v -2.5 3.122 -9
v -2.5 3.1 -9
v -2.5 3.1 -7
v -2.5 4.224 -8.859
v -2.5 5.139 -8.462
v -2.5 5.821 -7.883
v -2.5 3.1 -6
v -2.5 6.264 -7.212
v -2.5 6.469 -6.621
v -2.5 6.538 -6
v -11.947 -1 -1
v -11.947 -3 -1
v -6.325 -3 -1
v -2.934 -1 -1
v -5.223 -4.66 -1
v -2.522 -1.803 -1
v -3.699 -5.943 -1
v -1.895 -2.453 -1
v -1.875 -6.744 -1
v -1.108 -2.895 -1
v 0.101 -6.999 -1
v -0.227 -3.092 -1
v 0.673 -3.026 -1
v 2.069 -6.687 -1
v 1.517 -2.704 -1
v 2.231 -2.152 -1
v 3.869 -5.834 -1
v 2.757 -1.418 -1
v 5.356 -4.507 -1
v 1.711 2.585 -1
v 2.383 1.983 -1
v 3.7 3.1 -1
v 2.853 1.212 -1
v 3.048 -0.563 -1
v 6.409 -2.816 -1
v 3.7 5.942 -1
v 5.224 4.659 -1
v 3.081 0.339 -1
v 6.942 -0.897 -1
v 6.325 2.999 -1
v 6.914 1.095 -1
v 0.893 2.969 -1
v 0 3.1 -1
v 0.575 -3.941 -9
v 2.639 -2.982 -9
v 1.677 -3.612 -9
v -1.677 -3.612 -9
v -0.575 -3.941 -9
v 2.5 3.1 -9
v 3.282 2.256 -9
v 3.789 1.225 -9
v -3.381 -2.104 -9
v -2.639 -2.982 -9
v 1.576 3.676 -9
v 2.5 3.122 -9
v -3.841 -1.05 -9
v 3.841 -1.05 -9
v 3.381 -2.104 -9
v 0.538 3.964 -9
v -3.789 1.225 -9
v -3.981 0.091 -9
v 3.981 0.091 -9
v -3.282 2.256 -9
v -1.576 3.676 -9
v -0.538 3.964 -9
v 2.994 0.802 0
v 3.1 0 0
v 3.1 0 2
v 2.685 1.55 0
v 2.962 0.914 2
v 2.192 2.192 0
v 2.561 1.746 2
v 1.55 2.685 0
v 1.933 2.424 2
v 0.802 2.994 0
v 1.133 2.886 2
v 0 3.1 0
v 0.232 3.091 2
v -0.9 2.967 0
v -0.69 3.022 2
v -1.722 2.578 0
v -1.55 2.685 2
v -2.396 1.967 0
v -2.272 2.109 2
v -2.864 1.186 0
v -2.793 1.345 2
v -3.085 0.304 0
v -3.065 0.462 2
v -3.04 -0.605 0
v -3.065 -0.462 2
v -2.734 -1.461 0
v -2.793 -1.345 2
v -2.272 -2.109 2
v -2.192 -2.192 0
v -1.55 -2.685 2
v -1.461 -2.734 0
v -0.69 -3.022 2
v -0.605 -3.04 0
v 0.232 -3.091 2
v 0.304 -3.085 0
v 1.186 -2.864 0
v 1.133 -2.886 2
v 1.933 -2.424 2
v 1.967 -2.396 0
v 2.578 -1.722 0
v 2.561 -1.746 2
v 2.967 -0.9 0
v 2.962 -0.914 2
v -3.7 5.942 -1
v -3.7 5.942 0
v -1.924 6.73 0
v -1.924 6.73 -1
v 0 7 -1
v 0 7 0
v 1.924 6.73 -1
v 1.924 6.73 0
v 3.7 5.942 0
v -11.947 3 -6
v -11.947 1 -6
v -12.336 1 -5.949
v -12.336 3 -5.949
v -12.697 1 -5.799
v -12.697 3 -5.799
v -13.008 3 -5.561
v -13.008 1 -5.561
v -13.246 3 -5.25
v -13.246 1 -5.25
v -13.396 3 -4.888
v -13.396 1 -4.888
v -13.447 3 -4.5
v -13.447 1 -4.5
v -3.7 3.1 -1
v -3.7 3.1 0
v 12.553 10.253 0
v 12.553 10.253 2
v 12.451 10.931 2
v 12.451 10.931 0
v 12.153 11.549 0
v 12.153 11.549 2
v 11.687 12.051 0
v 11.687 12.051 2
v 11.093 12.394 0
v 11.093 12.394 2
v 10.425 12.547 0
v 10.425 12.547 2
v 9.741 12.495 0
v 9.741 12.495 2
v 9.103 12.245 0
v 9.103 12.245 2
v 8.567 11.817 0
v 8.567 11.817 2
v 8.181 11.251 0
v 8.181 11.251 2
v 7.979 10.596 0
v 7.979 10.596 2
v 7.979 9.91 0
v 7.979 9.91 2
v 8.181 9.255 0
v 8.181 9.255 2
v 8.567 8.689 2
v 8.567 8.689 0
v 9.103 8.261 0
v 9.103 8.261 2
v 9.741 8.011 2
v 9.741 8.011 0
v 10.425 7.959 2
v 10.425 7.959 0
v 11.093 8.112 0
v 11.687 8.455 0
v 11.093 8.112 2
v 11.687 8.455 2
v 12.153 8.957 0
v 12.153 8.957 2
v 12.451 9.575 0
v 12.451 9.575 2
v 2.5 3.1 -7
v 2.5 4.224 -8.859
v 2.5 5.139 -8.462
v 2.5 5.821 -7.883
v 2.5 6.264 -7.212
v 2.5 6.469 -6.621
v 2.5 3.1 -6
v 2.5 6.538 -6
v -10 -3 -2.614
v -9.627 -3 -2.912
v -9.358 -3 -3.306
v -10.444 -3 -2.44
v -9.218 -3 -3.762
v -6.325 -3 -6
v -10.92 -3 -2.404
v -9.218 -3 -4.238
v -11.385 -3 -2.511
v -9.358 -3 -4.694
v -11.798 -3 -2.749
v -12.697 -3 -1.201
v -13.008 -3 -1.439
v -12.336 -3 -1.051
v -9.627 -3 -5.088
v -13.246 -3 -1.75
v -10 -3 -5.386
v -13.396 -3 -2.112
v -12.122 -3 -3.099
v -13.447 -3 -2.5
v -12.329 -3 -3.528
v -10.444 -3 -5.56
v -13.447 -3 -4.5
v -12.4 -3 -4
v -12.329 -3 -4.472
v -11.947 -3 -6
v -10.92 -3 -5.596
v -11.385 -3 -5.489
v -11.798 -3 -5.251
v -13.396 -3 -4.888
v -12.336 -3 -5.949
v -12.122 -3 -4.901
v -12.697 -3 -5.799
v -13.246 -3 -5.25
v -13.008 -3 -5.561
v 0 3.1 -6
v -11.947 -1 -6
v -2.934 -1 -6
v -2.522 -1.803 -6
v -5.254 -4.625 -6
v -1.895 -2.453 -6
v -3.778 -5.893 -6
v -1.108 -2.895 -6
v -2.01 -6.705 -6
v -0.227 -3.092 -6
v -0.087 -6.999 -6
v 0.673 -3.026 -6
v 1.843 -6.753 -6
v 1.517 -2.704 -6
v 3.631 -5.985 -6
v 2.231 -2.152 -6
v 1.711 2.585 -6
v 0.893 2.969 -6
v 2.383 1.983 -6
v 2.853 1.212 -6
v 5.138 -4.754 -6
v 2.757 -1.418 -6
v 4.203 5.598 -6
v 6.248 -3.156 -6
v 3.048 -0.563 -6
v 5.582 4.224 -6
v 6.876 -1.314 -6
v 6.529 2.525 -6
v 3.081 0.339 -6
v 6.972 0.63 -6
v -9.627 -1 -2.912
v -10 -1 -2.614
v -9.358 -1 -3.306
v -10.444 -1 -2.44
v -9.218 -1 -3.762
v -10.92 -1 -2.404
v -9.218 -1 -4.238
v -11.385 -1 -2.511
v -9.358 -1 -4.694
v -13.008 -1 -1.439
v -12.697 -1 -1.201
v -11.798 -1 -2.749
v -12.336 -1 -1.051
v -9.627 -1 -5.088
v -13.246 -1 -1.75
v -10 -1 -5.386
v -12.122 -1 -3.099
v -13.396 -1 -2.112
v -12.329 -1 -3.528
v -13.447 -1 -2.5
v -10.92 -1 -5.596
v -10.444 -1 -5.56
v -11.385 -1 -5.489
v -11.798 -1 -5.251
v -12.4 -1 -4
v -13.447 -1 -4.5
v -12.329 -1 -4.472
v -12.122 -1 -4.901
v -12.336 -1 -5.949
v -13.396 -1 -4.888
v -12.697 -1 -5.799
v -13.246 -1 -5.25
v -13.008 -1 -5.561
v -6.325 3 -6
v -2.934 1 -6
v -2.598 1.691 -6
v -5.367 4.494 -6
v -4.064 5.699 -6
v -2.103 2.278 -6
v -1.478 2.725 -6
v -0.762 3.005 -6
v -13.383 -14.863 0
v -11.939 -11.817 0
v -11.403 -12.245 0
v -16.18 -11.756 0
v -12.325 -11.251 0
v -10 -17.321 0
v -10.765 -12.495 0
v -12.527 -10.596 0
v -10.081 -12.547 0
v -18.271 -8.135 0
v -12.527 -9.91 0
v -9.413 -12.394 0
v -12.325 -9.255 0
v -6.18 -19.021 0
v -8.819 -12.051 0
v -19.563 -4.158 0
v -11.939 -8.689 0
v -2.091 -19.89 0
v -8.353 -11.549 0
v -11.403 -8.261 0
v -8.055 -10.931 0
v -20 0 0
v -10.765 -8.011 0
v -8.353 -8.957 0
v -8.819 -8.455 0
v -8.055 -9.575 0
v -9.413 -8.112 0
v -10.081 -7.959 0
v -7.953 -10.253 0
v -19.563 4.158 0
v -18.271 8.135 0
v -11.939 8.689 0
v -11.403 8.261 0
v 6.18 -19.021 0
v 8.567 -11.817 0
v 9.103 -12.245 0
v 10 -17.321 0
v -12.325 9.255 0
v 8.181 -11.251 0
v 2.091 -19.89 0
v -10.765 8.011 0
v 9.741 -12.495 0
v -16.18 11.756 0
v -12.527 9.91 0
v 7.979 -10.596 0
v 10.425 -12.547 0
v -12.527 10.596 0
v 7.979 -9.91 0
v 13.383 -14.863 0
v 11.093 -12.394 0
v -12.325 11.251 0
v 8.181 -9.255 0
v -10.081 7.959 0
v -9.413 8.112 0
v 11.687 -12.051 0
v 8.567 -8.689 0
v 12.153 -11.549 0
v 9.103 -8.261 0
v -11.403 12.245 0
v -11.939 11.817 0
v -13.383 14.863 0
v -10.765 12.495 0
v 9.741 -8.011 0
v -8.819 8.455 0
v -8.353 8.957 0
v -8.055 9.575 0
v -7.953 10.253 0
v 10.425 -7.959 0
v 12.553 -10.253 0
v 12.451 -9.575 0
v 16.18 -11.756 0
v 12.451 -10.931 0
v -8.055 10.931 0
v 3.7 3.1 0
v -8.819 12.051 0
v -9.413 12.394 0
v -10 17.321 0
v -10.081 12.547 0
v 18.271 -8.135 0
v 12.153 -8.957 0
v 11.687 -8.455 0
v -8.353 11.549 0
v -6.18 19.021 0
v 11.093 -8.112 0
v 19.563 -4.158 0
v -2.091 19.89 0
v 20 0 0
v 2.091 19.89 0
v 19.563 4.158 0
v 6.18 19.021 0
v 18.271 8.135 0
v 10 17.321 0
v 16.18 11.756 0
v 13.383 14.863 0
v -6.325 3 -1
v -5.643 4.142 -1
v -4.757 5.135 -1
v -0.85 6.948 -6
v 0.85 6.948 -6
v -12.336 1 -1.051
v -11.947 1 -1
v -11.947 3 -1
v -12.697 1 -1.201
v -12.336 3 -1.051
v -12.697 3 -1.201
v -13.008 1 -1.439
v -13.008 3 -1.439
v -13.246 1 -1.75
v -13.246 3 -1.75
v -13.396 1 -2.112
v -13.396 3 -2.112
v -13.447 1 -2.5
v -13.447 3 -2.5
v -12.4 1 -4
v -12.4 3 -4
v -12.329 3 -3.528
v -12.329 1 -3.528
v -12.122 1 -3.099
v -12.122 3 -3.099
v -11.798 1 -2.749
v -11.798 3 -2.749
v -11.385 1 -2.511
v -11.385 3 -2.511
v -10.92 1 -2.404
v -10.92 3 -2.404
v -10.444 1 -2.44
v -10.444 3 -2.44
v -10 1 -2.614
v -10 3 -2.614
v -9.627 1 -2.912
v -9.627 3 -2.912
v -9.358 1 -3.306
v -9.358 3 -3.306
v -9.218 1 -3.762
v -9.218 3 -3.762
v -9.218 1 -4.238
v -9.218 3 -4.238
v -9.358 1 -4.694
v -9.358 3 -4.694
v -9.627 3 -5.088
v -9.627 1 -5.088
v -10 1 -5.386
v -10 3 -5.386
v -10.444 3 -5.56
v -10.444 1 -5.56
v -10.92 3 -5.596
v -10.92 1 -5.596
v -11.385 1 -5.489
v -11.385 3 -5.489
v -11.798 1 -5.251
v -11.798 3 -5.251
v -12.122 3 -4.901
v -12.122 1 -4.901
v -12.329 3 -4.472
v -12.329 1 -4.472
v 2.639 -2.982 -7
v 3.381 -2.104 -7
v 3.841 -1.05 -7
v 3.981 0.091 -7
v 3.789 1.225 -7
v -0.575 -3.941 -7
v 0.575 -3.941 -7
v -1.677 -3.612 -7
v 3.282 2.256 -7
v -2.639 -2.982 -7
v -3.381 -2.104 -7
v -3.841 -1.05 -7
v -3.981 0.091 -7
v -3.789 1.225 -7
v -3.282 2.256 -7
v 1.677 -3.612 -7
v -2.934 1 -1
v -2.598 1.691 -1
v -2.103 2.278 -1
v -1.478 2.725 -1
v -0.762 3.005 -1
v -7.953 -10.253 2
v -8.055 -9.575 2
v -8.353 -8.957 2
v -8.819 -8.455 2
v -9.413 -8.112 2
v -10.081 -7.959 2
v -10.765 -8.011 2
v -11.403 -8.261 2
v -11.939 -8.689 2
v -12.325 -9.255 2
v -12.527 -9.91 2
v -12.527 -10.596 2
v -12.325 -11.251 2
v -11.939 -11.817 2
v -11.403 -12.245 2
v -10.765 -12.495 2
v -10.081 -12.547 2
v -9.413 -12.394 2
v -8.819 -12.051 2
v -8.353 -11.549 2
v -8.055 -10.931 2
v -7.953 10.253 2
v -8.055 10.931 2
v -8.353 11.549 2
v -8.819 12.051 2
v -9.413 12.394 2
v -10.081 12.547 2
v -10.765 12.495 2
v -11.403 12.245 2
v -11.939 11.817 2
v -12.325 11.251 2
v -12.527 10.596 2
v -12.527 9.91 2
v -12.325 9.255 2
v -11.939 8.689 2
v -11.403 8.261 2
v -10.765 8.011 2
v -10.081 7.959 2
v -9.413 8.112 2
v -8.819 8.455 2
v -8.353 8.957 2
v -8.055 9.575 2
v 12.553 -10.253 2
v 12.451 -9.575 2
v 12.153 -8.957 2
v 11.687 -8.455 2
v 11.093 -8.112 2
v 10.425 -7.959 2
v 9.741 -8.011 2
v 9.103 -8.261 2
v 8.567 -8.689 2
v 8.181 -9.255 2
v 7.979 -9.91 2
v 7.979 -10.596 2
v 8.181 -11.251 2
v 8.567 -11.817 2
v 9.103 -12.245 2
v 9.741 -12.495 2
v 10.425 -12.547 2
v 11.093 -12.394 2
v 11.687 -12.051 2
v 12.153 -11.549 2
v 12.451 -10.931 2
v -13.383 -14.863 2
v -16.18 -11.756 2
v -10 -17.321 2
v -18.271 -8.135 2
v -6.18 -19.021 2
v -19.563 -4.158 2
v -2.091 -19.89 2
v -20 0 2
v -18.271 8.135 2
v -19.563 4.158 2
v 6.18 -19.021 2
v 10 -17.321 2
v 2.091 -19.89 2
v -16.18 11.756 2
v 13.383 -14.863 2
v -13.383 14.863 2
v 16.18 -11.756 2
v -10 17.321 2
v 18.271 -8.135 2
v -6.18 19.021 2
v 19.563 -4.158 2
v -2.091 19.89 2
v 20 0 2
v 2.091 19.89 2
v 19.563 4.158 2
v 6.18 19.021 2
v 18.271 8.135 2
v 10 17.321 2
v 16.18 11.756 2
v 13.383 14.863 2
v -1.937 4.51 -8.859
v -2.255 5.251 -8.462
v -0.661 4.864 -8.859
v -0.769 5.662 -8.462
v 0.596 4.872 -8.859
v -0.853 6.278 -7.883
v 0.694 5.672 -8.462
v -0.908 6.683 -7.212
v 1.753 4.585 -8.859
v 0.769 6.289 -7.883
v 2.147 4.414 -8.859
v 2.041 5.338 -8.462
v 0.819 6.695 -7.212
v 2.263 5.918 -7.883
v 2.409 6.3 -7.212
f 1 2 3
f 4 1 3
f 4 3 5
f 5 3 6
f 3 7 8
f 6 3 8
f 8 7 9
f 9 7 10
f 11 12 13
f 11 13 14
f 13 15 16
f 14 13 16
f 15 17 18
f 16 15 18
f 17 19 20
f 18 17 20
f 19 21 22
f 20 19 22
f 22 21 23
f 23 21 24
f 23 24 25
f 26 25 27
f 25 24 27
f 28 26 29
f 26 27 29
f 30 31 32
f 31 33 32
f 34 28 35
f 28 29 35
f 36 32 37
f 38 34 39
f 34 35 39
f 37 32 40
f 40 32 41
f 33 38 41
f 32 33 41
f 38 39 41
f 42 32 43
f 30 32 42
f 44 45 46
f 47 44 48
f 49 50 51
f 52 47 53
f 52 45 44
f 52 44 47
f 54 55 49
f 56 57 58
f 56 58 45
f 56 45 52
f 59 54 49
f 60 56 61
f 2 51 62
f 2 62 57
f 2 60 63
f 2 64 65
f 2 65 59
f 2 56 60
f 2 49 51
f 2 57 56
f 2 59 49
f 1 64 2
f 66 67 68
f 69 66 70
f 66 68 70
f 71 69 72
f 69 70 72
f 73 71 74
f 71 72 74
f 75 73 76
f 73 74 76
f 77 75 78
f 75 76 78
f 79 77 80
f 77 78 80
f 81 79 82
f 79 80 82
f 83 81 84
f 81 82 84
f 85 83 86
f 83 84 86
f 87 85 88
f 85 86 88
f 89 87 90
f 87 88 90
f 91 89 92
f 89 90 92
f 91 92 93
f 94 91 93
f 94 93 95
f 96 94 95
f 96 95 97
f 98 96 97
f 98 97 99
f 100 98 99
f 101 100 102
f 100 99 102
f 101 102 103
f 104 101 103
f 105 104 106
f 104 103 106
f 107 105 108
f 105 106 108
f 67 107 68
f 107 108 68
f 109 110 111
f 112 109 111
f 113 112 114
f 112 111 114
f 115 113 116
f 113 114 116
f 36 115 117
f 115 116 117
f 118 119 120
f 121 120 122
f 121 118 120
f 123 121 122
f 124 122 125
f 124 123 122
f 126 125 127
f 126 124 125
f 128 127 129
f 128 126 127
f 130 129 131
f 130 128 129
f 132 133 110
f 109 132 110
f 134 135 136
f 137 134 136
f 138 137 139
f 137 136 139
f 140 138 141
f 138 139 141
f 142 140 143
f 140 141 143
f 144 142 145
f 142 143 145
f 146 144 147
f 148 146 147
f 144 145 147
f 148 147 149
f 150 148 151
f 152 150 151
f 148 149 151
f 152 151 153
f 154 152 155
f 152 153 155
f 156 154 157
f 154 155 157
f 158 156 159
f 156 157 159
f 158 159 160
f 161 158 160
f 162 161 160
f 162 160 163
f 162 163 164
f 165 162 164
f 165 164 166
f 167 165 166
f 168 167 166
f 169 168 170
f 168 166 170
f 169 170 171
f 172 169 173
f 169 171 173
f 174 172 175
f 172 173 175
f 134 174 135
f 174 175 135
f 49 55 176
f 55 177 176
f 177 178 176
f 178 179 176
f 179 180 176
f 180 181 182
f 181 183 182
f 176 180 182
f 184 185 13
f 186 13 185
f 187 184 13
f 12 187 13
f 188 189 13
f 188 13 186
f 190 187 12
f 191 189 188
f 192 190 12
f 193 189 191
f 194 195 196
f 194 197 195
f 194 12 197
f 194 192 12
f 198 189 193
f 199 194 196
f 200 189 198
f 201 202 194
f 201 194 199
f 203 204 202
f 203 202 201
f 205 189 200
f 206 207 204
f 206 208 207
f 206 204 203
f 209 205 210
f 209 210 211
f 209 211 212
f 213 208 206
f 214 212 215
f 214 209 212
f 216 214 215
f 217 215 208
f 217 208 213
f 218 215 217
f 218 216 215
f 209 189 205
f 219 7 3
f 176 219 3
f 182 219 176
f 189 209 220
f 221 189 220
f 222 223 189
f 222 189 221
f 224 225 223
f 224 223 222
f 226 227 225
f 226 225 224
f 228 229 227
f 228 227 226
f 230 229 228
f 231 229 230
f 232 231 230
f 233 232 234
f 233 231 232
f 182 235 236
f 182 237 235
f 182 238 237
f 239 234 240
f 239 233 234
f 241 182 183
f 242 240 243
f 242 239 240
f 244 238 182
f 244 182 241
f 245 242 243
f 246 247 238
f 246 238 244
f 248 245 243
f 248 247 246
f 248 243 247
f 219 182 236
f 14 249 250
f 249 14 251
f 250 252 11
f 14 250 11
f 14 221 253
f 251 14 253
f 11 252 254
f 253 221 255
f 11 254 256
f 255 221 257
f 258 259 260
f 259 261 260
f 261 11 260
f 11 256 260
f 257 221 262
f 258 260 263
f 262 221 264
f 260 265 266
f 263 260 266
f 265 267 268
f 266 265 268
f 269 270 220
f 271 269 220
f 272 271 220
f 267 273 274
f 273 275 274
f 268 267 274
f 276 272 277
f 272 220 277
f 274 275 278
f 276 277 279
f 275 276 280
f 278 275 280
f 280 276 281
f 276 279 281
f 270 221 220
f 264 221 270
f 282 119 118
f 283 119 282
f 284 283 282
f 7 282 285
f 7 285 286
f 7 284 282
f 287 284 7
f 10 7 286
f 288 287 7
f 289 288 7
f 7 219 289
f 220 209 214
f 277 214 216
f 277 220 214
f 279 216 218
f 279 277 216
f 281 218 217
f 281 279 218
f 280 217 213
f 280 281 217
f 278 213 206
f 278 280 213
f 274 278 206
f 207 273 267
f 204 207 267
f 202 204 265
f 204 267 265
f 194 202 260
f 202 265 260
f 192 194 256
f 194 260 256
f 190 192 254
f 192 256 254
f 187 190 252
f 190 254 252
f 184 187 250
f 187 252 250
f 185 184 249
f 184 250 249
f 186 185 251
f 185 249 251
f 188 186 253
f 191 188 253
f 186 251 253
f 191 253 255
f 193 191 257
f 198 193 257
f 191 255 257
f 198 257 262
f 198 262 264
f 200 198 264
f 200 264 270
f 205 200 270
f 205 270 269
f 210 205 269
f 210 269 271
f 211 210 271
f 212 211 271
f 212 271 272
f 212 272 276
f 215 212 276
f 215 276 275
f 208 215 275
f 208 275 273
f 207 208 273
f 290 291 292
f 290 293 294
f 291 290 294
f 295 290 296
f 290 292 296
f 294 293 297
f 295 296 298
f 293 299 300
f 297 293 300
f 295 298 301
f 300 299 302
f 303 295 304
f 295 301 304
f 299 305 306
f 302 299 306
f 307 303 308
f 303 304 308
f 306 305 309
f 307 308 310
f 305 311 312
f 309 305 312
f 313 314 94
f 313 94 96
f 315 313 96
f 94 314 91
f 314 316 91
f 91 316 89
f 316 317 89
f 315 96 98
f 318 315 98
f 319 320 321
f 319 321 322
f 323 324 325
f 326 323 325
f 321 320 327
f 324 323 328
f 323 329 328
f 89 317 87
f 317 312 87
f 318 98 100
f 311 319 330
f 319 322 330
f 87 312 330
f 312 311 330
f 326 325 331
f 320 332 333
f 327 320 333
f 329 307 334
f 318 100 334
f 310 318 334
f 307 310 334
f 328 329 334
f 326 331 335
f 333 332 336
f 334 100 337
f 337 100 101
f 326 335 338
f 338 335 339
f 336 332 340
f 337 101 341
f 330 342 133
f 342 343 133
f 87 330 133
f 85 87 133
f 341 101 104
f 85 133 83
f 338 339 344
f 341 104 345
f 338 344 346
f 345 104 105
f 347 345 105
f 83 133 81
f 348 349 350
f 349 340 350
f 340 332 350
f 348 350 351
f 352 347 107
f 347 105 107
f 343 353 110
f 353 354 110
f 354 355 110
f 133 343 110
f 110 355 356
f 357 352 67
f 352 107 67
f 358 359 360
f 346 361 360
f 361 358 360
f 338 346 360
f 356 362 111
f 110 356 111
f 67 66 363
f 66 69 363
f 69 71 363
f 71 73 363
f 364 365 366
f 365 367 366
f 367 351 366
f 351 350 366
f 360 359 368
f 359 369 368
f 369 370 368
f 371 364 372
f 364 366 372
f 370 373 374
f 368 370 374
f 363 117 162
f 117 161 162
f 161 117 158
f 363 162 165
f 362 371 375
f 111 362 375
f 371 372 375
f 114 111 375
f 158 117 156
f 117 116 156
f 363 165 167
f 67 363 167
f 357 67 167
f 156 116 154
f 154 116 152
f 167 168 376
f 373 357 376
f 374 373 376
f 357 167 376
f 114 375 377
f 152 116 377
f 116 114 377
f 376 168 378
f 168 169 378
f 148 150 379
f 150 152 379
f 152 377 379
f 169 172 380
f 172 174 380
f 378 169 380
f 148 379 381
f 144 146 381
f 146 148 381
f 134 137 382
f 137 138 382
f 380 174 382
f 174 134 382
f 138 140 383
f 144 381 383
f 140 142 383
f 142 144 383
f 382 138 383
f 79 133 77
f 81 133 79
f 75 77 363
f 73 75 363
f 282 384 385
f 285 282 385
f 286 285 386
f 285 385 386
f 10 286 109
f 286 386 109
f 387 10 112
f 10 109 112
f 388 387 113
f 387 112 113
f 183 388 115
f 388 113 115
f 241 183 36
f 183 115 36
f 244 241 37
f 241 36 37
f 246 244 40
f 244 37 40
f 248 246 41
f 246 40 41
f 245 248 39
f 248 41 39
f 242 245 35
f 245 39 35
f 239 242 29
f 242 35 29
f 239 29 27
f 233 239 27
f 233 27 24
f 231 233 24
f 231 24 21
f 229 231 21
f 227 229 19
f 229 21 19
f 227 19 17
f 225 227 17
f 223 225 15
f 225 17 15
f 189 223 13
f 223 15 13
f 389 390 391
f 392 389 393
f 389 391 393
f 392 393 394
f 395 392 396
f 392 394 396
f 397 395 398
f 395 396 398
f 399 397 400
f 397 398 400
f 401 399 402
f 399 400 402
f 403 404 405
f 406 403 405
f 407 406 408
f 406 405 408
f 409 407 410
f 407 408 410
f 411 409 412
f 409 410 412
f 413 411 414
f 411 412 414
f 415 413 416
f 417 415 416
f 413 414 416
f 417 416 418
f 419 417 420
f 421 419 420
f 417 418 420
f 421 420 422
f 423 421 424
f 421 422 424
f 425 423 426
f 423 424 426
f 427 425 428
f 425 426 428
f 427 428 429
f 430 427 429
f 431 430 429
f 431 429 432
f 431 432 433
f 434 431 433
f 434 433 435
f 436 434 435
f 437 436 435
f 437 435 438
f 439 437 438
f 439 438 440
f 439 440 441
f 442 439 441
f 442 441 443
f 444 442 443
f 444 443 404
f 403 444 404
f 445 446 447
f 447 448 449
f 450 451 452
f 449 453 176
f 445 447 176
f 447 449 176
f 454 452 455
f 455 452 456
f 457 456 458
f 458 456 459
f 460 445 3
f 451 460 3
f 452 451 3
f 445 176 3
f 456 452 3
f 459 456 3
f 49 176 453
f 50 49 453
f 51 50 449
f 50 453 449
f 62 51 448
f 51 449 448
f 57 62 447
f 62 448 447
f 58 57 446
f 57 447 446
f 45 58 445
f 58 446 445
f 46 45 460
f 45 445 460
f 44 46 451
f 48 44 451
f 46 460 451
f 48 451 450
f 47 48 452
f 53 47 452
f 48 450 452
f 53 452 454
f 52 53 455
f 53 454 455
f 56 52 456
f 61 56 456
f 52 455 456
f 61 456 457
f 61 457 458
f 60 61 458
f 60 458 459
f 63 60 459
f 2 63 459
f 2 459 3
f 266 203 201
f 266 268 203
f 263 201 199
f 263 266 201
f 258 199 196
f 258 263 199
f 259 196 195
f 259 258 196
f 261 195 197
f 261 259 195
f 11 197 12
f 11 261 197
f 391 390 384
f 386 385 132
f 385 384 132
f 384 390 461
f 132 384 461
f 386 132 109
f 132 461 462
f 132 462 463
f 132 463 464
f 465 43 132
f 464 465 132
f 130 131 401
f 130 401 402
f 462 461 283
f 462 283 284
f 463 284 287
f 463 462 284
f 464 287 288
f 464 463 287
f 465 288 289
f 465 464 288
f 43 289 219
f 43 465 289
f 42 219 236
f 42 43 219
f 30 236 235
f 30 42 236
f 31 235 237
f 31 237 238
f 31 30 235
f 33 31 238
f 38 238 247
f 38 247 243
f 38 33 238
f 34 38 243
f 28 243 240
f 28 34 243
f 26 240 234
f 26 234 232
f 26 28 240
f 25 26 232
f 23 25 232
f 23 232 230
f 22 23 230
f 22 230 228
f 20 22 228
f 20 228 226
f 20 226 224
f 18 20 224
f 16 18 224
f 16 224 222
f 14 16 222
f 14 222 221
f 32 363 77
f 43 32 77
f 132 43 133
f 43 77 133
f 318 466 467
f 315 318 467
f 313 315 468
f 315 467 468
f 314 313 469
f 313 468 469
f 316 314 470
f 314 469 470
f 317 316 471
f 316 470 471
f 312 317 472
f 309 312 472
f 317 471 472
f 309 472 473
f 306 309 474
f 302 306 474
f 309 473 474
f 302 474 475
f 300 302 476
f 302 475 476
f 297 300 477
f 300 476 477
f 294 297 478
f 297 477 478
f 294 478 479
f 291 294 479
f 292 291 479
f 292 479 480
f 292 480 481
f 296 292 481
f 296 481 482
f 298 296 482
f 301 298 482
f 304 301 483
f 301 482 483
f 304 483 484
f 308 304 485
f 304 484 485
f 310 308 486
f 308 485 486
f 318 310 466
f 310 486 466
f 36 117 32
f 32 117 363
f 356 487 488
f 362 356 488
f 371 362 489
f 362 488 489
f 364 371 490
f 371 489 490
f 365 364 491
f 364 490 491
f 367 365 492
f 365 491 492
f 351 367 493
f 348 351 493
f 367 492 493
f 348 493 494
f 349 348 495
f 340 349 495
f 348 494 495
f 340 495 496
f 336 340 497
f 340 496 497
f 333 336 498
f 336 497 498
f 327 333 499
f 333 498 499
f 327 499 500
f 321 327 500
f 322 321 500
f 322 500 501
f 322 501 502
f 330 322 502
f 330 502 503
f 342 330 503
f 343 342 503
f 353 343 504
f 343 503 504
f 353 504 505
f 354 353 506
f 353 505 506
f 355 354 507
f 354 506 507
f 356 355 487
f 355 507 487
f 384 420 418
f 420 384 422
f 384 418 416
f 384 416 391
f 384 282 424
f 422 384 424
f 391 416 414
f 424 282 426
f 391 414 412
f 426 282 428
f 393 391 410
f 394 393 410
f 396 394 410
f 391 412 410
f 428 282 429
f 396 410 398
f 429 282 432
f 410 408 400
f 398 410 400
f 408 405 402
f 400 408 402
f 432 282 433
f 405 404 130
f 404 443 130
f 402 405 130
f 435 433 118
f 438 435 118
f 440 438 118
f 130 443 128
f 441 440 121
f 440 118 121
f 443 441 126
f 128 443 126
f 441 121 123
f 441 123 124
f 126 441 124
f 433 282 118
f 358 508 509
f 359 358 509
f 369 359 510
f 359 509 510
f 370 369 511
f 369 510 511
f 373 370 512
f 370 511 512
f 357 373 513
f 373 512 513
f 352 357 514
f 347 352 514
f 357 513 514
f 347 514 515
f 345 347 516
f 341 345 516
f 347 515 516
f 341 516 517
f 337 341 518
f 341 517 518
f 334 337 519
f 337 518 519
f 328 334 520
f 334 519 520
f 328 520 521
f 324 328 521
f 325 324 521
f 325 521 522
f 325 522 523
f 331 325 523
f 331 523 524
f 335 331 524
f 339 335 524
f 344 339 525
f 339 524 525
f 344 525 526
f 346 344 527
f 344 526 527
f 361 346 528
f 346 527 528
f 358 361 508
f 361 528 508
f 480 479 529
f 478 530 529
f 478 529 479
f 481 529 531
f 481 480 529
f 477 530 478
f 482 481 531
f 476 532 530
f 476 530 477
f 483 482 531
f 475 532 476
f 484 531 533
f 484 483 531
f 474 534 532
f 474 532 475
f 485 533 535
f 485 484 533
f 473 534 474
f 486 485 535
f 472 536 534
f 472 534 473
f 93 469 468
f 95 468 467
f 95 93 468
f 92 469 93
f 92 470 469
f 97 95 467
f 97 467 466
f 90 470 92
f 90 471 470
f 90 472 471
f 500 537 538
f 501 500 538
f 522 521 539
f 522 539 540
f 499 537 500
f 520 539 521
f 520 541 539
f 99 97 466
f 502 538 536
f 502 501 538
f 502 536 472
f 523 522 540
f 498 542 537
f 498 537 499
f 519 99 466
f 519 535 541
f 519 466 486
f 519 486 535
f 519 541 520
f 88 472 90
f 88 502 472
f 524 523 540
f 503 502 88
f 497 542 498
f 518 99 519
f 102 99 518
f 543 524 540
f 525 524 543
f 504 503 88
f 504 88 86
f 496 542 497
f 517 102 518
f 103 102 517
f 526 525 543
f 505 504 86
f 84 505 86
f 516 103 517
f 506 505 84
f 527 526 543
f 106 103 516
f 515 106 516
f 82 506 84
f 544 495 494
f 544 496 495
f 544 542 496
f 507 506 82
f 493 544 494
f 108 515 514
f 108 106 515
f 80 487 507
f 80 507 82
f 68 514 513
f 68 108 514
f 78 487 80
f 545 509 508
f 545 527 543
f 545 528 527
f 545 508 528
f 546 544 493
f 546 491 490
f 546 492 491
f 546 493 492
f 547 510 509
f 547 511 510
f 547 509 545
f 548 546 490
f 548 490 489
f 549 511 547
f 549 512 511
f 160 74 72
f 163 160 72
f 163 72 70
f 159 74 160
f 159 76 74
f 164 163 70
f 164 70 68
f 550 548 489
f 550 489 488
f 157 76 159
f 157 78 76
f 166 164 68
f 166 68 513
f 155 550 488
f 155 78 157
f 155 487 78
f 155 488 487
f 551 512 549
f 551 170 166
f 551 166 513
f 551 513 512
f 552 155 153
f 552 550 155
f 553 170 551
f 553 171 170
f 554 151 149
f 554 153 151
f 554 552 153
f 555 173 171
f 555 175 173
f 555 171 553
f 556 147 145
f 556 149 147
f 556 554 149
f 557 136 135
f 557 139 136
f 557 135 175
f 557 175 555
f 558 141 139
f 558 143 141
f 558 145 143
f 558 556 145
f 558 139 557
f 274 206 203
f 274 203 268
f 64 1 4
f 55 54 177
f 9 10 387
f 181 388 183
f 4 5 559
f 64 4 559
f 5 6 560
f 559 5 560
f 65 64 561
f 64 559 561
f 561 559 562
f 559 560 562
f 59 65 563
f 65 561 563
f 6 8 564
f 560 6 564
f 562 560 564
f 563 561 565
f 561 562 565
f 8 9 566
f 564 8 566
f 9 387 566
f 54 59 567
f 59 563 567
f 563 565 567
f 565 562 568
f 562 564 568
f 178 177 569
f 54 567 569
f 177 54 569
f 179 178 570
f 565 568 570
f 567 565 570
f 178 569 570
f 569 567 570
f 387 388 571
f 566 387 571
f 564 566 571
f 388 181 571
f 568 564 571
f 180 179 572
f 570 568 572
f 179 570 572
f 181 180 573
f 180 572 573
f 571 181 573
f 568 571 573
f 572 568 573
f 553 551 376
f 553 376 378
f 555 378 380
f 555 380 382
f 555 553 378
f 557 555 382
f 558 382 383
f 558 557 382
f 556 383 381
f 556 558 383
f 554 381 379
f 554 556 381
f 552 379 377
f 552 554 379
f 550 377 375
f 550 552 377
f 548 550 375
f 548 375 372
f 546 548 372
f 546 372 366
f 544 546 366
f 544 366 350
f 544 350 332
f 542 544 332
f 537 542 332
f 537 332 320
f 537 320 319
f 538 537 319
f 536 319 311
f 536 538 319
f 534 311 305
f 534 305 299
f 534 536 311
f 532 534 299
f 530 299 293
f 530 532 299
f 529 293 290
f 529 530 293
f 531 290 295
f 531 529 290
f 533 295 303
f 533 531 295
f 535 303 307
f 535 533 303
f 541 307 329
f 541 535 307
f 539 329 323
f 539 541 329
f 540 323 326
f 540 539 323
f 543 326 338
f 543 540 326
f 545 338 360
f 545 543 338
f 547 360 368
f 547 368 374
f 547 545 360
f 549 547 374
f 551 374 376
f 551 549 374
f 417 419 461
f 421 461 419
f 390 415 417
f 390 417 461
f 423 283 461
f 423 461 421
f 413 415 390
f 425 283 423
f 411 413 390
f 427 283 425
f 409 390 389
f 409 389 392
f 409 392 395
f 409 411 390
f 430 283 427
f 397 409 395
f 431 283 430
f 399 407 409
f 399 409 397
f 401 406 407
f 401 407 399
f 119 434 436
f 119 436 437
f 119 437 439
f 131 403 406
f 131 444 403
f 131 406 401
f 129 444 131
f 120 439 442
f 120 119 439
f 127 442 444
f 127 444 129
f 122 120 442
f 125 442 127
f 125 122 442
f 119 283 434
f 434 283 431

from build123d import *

# Parameters (mm, degrees)
SKETCH_1_R          = 14
SKETCH_1_R_2        = 1.5
EXTRUDE_1_DEPTH     = 2
CUT_EXTRUDE_1_DEPTH = 20.899748742
EXTRUDE_4_DEPTH     = 1
SKETCH_6_R          = 7
SKETCH_6_R_2        = 3.1
EXTRUDE_5_DEPTH     = 5
EXTRUDE_6_DEPTH     = 1
SKETCH_8_W          = 8
SKETCH_8_H          = 2
EXTRUDE_7_DEPTH     = 5
SKETCH_9_R          = 1.6
CUT_EXTRUDE_3_DEPTH = 24.108440017
EXTRUDE_8_DEPTH     = 2
SKETCH_11_W         = 12.041493288
SKETCH_11_H         = 2
CUT_EXTRUDE_4_DEPTH = 5
SKETCH_12_R         = 20
SKETCH_12_R_2       = 3.1
EXTRUDE_9_DEPTH     = 2
SKETCH_13_R         = 2.3
CUT_EXTRUDE_5_DEPTH = 2
CUT_EXTRUDE_START   = -1
CUT_EXTRUDE_6_DEPTH = 1
FILLET_1_R          = 3
FILLET_2_R          = 1.5


with BuildPart() as part:
    # 草图1 → 凸台-拉伸1 (new body)
    with BuildSketch(Plane.XY):
        Circle(SKETCH_1_R)
        with Locations((-7.071067812, 7.071067812)):
            Circle(SKETCH_1_R_2, mode=Mode.SUBTRACT)
        with Locations((7.071067812, 7.071067812)):
            Circle(SKETCH_1_R_2, mode=Mode.SUBTRACT)
        with Locations((-7.071067812, -7.071067812)):
            Circle(SKETCH_1_R_2, mode=Mode.SUBTRACT)
        with Locations((7.071067812, -7.071067812)):
            Circle(SKETCH_1_R_2, mode=Mode.SUBTRACT)
    extrude(amount=EXTRUDE_1_DEPTH)

    # 草图2 → 切除-拉伸1 (cut, through all)
    with BuildSketch(Plane(origin=(0, 0, 0), x_dir=(-1, 0, 0), z_dir=(0, 0, -1))):
        with BuildLine():
            ThreePointArc((-2.683281573, 3.1), (-4.1, 0), (-2.683281573, -3.1))
            Line((-2.683281573, -3.1), (2.683281573, -3.1))
            ThreePointArc((2.683281573, -3.1), (4.1, 0), (2.683281573, 3.1))
            Line((2.683281573, 3.1), (-2.683281573, 3.1))
        make_face()
    extrude(amount=-CUT_EXTRUDE_1_DEPTH, mode=Mode.SUBTRACT)

    # 草图3 → 凸台-拉伸4 (add)
    with BuildSketch(Plane(origin=(0, 0, 0), x_dir=(-1, 0, 0), z_dir=(0, 0, -1))):
        Polygon((0, 3.1), (3.7, 3.1), (3.7, 7.1), (-3.7, 7.1), (-3.7, 3.1), align=None)
    extrude(amount=EXTRUDE_4_DEPTH)

    # 草图6 → 凸台-拉伸5 (add)
    with BuildSketch(Plane(origin=(0, 0, -1), x_dir=(-1, 0, 0), z_dir=(0, 0, -1))):
        with Locations(Location((0, 0, 0), (0, 0, 121.908982735))):
            Circle(SKETCH_6_R)
        with Locations(Location((0, 0, 0), (0, 0, 90))):
            Circle(SKETCH_6_R_2, mode=Mode.SUBTRACT)
    extrude(amount=EXTRUDE_5_DEPTH)

    # 草图7 → 凸台-拉伸6 (add)
    with BuildSketch(Plane(origin=(0, 0, -6), x_dir=(-1, 0, 0), z_dir=(0, 0, -1))):
        with BuildLine():
            Line((-2.5, 3.1), (-2.5, 6.538348415))
            ThreePointArc((-2.5, 6.538348415), (0, 7), (2.5, 6.538348415))
            Line((2.5, 6.538348415), (2.5, 3.1))
            Line((2.5, 3.1), (-2.5, 3.1))
        make_face()
    extrude(amount=EXTRUDE_6_DEPTH)

    # 草图8 → 凸台-拉伸7 (add)
    with BuildSketch(Plane(origin=(0, 0, -6), x_dir=(-1, 0, 0), z_dir=(0, 0, -1))):
        with Locations((9.447401339, 2)):
            Rectangle(SKETCH_8_W, SKETCH_8_H)
        with Locations((9.447401339, -2)):
            Rectangle(SKETCH_8_W, SKETCH_8_H)
    extrude(amount=-EXTRUDE_7_DEPTH)

    # 草图9 → 切除-拉伸3 (cut, through all)
    with BuildSketch(Plane(origin=(0, 3, 0), x_dir=(1, 0, 0), z_dir=(0, 1, 0))):
        with Locations(Location((-10.8, 4, 0), (0, 0, 180))):
            Circle(SKETCH_9_R)
    extrude(amount=-CUT_EXTRUDE_3_DEPTH, mode=Mode.SUBTRACT)

    # 草图10 → 凸台-拉伸8 (add)
    with BuildSketch(Plane(origin=(0, 0, -7), x_dir=(-1, 0, 0), z_dir=(0, 0, -1))):
        with BuildLine():
            Line((-2.5, 6.538348415), (-2.5, 3.1))
            ThreePointArc((-2.5, 3.1), (0, -3.98246155), (2.5, 3.1))
            Line((2.5, 3.1), (2.5, 6.538348415))
            ThreePointArc((2.5, 6.538348415), (0, 7), (-2.5, 6.538348415))
        make_face()
    extrude(amount=EXTRUDE_8_DEPTH)

    # 草图11 → 切除-拉伸4 (cut)
    with BuildSketch(Plane(origin=(0, 0, -6), x_dir=(-1, 0, 0), z_dir=(0, 0, -1))):
        with Locations((7.426654695, 0)):
            Rectangle(SKETCH_11_W, SKETCH_11_H)
    extrude(amount=-CUT_EXTRUDE_4_DEPTH, mode=Mode.SUBTRACT)

    # 草图12 → 凸台-拉伸9 (add)
    with BuildSketch(Plane.XY.offset(2)):
        Circle(SKETCH_12_R)
        Circle(SKETCH_12_R_2, mode=Mode.SUBTRACT)
    extrude(amount=-EXTRUDE_9_DEPTH)

    # 草图13 → 切除-拉伸5 (cut)
    with BuildSketch(Plane.XY.offset(2)):
        with Locations((10.253048327, 10.253048327)):
            Circle(SKETCH_13_R)
        with Locations((-10.253048327, 10.253048327)):
            Circle(SKETCH_13_R)
        with Locations((-10.253048327, -10.253048327)):
            Circle(SKETCH_13_R)
        with Locations((10.253048327, -10.253048327)):
            Circle(SKETCH_13_R)
    extrude(amount=-CUT_EXTRUDE_5_DEPTH, mode=Mode.SUBTRACT)

    # 草图14 → 切除-拉伸6 (cut)
    with BuildSketch(Plane(origin=(0, 0, -1), x_dir=(-1, 0, 0), z_dir=(0, 0, -1)).offset(CUT_EXTRUDE_START)):
        with BuildLine():
            Line((-4.590882623, 5.284297185), (-4.590882623, 9.738638689))
            Line((-4.590882623, 9.738638689), (4.724825977, 9.738638689))
            Line((4.724825977, 9.738638689), (4.724825977, 5.164883298))
            ThreePointArc((4.724825977, 5.164883298), (0.089722487, 6.999424967), (-4.590882623, 5.284297185))
        make_face()
    extrude(amount=CUT_EXTRUDE_6_DEPTH, mode=Mode.SUBTRACT)

    # 圆角1
    fillet_1_edges = [part.edges().sort_by_distance(p)[0] for p in [
        (0, 7, -9),
    ]]
    fillet(fillet_1_edges, radius=FILLET_1_R)

    # 圆角2
    fillet_2_edges = [part.edges().sort_by_distance(p)[0] for p in [
        (-13.447401339, -2, -1),
        (-13.447401339, -2, -6),
        (-13.447401339, 2, -1),
        (-13.447401339, 2, -6),
    ]]
    fillet(fillet_2_edges, radius=FILLET_2_R)


solid = part.part
